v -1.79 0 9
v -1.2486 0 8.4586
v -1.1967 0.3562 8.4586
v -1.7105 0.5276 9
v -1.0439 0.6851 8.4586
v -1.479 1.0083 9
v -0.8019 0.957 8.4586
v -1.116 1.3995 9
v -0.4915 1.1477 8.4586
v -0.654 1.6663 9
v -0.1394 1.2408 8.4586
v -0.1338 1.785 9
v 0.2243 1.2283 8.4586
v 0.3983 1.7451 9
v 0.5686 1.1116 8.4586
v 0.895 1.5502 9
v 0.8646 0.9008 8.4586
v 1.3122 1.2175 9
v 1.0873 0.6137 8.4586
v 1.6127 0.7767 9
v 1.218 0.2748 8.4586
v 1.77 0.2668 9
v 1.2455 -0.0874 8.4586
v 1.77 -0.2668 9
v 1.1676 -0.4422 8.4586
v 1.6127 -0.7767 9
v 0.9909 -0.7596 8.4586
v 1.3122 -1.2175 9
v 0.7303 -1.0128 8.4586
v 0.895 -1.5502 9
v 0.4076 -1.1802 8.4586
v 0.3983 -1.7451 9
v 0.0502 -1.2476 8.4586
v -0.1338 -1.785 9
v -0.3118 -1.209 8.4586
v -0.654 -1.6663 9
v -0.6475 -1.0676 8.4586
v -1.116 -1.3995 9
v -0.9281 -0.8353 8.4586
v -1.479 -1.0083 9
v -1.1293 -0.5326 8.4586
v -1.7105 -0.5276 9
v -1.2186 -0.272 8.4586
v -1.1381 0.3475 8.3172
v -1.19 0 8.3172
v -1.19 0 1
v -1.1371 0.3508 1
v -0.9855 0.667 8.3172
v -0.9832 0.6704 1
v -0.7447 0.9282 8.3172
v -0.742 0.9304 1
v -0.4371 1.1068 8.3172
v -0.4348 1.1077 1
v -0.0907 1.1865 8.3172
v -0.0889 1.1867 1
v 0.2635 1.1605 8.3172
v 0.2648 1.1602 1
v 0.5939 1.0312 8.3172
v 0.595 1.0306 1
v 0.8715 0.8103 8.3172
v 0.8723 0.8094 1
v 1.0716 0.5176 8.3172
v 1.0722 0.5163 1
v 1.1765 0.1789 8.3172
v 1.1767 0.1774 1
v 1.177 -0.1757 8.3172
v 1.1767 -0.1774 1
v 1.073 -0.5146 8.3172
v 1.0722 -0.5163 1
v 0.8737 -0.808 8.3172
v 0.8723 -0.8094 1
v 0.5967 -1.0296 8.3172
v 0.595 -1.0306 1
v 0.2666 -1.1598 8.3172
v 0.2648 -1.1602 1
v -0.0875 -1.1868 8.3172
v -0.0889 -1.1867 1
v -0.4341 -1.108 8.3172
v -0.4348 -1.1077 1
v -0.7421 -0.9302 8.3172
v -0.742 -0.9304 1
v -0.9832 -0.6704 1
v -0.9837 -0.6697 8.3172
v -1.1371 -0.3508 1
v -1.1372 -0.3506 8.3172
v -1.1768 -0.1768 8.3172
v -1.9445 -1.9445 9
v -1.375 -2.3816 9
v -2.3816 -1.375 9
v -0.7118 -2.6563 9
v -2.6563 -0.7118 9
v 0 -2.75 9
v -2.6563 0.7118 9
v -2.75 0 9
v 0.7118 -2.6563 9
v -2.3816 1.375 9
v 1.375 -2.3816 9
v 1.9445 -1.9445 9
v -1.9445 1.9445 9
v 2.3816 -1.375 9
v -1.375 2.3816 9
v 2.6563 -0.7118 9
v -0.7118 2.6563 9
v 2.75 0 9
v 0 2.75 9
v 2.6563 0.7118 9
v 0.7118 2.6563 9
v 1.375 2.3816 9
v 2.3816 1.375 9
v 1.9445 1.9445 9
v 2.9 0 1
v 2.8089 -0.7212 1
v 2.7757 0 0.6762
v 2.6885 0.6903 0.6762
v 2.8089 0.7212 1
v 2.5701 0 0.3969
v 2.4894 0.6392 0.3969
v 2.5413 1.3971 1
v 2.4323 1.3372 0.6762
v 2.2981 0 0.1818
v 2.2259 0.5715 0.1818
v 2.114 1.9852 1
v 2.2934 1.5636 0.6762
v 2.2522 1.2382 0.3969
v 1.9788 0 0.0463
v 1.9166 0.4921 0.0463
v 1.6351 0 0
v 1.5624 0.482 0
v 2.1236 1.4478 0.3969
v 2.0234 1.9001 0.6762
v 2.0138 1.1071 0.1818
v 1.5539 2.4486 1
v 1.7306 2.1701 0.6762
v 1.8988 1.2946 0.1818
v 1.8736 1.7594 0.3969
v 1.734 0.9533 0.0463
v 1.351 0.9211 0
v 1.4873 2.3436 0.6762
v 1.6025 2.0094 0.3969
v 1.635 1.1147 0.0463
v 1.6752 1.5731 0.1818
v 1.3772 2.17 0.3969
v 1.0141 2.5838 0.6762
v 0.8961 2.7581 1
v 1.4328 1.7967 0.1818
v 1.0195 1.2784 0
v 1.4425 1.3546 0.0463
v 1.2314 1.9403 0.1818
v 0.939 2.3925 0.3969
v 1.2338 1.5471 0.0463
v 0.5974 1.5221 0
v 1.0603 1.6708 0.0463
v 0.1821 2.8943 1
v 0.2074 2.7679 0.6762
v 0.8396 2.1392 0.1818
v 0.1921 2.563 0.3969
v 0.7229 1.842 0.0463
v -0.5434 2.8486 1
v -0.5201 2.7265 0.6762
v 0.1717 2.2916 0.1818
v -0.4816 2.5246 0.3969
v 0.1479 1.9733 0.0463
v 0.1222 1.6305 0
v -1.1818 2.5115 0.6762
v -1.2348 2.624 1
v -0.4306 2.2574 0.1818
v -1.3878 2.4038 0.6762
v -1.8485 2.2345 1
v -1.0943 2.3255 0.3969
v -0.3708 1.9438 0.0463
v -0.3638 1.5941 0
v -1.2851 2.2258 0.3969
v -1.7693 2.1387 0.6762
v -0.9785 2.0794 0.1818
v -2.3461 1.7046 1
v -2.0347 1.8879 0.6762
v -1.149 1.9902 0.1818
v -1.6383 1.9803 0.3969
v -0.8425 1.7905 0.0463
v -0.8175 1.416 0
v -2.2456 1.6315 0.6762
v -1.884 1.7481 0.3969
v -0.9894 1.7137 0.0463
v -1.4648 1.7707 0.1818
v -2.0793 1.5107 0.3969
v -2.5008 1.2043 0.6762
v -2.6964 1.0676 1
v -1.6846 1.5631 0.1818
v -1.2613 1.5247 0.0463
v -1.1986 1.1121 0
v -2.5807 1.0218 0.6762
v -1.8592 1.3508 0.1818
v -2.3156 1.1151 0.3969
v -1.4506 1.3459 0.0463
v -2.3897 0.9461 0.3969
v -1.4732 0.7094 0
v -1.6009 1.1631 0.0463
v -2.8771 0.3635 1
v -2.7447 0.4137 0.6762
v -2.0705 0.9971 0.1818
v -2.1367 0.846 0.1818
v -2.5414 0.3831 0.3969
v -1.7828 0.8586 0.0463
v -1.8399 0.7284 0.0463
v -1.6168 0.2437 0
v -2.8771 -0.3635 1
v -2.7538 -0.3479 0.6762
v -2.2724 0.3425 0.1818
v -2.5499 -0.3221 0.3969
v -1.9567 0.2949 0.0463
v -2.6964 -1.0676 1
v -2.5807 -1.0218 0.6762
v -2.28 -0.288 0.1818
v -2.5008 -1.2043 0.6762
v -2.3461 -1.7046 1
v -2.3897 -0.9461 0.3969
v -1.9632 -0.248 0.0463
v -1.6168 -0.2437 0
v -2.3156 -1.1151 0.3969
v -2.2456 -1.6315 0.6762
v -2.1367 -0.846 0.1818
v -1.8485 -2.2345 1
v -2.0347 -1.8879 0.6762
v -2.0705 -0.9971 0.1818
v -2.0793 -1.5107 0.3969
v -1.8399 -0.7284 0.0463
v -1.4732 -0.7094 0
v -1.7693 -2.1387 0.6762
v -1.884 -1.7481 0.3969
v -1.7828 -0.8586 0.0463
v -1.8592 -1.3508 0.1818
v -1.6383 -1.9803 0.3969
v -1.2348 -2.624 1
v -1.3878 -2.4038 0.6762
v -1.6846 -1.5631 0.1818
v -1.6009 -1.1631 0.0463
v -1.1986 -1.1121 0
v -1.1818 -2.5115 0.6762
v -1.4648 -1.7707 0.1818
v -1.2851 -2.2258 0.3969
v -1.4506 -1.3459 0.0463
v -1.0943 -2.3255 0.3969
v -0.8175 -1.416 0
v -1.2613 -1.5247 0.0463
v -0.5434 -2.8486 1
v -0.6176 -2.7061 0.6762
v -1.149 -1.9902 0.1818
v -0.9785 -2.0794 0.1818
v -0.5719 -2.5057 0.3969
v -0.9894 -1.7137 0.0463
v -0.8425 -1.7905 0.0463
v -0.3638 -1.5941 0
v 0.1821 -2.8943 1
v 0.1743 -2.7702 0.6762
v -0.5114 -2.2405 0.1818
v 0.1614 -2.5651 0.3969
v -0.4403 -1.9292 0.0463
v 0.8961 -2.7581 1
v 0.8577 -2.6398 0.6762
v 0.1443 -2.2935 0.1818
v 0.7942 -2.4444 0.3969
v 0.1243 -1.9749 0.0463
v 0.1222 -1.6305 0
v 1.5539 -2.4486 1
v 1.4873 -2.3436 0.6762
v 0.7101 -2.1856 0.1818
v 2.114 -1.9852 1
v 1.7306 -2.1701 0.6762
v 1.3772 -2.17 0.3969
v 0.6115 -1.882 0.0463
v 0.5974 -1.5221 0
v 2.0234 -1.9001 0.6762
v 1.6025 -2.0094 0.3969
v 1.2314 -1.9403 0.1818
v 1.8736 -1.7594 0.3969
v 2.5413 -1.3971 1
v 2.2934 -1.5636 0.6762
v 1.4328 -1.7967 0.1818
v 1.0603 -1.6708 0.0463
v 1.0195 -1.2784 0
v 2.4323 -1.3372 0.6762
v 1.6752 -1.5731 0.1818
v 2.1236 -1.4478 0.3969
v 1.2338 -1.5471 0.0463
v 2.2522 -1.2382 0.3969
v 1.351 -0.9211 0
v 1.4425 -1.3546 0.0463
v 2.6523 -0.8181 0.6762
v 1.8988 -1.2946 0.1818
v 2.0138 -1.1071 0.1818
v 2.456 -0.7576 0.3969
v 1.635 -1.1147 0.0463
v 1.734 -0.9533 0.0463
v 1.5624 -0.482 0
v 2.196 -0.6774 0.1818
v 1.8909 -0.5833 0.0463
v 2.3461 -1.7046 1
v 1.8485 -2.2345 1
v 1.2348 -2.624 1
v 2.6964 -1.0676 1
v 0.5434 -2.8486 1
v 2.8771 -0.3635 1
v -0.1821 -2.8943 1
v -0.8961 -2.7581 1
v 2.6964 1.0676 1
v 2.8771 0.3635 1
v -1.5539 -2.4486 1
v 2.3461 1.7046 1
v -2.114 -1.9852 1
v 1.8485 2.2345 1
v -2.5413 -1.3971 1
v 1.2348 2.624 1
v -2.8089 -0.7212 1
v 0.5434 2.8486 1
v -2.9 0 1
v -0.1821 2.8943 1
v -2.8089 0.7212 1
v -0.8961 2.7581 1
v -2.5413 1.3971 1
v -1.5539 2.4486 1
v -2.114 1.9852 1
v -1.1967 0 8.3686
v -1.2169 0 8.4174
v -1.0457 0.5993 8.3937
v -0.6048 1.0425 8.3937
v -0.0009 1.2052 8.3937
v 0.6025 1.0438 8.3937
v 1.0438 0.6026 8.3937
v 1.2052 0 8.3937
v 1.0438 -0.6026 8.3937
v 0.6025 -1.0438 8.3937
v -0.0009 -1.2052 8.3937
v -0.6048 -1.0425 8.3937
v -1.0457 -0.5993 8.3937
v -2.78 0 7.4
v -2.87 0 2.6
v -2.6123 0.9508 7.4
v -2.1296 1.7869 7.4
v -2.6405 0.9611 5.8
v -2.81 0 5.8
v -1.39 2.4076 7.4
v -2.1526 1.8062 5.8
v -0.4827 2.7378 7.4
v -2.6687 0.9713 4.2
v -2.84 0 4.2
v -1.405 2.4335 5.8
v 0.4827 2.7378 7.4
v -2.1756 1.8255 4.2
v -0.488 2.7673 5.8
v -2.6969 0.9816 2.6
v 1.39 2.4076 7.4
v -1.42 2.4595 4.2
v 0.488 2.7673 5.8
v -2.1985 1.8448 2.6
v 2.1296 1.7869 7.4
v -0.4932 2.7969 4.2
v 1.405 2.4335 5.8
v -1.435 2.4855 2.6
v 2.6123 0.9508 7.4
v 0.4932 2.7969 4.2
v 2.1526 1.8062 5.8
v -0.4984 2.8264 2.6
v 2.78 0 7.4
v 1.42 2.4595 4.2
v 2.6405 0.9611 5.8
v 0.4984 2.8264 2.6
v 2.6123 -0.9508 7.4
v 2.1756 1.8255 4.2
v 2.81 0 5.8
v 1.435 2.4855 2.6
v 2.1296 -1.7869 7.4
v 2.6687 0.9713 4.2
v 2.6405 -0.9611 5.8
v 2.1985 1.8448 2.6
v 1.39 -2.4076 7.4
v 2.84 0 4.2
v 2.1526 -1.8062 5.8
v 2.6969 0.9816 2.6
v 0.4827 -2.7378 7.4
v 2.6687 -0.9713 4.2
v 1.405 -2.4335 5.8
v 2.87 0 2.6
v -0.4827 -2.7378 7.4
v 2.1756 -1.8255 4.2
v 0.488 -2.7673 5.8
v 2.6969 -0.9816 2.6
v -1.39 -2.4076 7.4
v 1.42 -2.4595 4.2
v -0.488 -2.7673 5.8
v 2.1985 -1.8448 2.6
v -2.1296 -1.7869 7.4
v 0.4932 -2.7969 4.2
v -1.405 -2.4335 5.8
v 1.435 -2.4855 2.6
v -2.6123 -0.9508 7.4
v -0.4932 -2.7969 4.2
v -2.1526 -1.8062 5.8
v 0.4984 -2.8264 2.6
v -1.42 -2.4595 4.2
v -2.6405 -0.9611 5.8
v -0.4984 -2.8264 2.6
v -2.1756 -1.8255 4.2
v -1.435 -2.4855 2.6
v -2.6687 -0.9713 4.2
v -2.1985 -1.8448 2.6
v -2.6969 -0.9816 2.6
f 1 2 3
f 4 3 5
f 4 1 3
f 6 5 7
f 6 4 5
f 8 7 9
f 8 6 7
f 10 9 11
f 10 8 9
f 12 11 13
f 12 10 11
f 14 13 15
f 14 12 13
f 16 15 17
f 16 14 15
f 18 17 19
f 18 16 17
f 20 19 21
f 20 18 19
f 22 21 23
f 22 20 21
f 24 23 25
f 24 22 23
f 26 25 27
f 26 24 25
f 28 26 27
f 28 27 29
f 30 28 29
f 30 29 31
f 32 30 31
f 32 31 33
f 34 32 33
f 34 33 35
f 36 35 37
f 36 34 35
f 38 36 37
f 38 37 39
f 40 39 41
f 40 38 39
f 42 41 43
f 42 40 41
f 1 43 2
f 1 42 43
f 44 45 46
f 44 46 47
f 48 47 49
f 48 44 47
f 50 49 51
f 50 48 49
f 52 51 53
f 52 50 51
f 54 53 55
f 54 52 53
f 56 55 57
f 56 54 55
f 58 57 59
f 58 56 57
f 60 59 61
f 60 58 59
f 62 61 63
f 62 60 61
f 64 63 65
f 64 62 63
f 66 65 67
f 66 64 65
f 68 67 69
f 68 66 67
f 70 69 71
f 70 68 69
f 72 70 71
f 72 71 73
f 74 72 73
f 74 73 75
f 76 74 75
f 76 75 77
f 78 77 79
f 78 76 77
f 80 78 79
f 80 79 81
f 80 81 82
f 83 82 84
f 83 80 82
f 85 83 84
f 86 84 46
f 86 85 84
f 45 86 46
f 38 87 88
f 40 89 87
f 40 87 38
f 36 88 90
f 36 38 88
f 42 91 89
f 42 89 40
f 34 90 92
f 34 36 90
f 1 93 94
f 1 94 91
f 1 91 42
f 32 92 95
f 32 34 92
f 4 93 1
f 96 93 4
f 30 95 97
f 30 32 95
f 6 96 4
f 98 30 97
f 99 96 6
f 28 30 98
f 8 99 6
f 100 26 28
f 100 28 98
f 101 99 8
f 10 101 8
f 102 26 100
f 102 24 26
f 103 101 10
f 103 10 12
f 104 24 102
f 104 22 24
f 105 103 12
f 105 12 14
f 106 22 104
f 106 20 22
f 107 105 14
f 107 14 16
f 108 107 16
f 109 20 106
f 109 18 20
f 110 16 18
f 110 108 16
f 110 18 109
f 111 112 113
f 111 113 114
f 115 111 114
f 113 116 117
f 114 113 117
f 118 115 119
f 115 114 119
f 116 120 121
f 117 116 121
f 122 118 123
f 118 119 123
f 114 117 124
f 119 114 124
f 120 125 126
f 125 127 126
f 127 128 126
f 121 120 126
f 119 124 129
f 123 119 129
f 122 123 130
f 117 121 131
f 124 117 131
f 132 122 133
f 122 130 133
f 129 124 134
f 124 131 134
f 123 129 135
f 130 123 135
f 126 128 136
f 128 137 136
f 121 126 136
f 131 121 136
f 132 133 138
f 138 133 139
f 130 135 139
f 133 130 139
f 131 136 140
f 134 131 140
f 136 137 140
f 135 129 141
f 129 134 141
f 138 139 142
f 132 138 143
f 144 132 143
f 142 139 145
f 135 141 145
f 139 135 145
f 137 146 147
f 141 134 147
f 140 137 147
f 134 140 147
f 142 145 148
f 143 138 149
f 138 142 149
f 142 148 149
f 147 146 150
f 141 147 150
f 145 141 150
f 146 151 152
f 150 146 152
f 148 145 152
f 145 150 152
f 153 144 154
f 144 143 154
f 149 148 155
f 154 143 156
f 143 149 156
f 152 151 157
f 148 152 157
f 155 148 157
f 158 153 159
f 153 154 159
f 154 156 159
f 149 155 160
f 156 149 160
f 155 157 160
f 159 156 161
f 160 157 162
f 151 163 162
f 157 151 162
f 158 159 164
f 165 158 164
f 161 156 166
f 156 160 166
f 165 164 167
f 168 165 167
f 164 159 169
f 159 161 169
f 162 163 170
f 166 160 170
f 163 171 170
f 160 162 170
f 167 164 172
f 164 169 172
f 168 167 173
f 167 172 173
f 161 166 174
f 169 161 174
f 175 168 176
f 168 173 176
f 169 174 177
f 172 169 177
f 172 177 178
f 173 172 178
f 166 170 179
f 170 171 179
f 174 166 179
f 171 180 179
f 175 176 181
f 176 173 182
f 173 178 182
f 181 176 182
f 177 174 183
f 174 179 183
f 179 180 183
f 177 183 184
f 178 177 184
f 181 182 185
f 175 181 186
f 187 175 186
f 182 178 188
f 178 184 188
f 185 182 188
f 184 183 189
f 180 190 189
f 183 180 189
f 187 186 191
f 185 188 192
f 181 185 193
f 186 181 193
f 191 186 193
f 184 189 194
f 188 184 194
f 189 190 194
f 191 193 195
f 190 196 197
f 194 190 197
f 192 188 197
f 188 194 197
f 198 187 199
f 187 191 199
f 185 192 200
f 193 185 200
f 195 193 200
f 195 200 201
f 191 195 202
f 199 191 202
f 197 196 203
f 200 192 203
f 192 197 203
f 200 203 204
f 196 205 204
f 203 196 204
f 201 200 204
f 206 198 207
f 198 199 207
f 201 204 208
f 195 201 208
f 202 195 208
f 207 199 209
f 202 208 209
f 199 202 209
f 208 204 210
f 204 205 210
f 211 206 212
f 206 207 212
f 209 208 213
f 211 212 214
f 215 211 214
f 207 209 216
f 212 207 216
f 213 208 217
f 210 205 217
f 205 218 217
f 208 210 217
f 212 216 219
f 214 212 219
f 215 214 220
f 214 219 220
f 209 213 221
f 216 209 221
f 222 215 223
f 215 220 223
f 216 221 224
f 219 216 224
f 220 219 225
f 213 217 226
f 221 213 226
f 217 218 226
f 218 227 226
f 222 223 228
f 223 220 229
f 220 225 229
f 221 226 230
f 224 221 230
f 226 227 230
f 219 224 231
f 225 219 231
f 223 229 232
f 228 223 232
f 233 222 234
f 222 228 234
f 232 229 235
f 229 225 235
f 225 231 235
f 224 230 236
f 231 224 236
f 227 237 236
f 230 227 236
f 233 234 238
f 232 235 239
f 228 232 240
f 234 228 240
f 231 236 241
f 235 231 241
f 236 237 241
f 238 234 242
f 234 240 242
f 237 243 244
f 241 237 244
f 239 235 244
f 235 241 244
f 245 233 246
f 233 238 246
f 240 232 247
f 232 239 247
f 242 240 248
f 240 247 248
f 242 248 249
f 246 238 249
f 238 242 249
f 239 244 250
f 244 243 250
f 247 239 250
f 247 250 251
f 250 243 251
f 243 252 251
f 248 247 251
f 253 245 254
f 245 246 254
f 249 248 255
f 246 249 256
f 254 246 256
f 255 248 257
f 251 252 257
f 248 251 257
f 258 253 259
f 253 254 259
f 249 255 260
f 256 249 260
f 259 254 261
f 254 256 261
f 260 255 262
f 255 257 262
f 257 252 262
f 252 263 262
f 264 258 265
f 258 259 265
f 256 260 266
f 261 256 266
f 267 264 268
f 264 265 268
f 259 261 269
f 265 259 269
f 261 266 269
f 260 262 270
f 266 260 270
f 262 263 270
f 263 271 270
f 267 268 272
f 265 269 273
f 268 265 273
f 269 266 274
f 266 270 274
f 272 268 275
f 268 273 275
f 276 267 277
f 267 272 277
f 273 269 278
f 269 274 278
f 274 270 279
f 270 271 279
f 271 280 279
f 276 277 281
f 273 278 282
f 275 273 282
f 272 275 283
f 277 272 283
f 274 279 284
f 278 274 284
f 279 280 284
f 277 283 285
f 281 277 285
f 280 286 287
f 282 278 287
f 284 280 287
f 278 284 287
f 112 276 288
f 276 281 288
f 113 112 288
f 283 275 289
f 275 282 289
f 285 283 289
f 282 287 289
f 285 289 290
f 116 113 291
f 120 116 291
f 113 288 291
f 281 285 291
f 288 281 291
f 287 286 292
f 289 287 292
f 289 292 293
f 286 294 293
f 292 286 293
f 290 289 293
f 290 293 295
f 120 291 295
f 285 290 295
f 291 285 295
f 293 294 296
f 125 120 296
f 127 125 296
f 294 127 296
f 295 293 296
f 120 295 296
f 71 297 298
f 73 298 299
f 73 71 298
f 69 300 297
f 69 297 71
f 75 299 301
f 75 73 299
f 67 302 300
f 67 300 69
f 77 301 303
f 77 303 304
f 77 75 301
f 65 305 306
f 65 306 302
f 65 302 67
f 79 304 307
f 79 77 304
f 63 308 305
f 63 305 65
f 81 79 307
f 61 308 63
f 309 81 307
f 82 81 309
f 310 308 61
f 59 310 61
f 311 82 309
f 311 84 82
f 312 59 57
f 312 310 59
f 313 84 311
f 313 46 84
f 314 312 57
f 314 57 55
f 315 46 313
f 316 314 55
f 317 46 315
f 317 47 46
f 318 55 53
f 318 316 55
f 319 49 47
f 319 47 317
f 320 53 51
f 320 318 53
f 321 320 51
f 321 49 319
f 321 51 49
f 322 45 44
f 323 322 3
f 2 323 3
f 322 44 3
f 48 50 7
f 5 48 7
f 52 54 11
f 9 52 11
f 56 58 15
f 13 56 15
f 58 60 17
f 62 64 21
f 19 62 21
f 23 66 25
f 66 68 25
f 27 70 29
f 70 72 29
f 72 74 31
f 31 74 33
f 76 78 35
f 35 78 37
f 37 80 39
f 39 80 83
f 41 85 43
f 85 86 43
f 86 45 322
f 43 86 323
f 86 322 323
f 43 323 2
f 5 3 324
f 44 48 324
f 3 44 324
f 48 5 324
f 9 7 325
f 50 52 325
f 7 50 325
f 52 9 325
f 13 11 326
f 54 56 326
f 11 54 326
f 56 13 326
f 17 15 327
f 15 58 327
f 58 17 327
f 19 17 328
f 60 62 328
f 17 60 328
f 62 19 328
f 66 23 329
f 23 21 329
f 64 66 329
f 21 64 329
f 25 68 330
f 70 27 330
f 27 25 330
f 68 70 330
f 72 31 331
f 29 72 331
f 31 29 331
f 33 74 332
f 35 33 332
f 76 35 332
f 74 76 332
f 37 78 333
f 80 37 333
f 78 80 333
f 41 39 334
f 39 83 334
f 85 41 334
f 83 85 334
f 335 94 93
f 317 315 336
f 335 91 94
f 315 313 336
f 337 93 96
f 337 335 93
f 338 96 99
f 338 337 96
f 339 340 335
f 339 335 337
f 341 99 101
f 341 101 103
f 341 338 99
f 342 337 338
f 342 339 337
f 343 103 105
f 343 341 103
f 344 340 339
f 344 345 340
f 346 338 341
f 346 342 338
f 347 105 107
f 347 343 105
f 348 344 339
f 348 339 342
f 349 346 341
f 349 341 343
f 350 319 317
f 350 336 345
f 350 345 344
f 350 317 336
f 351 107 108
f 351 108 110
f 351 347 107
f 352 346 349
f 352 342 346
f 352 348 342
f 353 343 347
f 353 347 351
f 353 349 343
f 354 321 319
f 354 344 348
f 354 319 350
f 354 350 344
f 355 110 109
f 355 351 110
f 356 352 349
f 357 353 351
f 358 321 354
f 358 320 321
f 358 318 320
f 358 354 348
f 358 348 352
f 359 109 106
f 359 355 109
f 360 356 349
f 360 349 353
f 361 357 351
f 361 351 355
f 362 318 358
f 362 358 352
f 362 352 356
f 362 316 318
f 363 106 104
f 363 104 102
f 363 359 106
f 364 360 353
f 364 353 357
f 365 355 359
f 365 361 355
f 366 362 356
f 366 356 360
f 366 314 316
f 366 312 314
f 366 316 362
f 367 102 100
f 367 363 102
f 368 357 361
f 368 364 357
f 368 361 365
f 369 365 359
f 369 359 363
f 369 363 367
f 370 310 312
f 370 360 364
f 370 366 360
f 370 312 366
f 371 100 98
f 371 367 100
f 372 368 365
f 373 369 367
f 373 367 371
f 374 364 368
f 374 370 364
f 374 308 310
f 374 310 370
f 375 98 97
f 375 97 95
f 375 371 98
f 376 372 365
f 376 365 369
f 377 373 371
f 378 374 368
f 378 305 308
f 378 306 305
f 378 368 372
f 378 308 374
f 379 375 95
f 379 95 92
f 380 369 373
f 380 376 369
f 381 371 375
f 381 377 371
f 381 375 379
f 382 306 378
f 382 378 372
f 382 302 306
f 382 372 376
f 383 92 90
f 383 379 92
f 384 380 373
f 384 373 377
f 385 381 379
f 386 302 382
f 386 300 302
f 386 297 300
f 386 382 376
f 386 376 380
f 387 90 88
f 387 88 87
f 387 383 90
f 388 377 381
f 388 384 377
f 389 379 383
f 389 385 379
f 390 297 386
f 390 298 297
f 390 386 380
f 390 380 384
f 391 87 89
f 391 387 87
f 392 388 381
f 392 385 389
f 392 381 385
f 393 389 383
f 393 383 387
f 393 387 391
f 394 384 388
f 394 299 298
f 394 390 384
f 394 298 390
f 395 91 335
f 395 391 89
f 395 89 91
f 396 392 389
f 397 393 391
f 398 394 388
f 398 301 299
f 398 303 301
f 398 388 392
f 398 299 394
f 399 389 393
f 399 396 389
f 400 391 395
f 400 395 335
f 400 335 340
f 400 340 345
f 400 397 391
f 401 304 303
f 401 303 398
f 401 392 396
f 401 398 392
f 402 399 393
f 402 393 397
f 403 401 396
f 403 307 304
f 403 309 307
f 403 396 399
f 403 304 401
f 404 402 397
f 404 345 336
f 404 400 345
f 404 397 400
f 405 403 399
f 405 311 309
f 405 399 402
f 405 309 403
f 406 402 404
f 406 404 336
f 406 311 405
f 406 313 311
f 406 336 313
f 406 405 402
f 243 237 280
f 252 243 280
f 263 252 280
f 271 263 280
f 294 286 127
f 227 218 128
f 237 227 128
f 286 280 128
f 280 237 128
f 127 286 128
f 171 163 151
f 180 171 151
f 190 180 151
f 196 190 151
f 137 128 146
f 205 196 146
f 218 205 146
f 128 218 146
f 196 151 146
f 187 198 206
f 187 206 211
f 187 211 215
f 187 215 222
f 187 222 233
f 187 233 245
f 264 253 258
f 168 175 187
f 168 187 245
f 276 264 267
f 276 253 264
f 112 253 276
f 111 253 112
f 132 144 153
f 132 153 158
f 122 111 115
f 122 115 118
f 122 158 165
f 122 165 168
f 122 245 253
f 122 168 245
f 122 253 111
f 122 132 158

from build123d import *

# Parameters (mm, degrees)
F0_R     = 2.9
F1_DEPTH = 1
F5_SIZE  = 0.6
F6_R     = 0.2


# Not quite as in the source:
# - a fillet or chamfer that OpenCascade refuses, or shapes differently, is made with other operations: its cross-section is extruded or revolved along the edge and cut away or added


with BuildPart() as f1:
    # F0 (on Top) → F1 (new body)
    with BuildSketch(Plane.XY):
        Circle(F0_R)
    extrude(amount=F1_DEPTH)

    # F4: fillet of radius 1.3 on 1 edges, made by hand

    # F4_s1 → F4_t2 (revolve, cut)
    with BuildSketch(Plane.XZ):
        with BuildLine():
            ThreePointArc((2.9, 1), (2.4413147108, 0.2801960973), (1.6350889359, 0))
            Line((1.6350889359, 0), (2.9, 0))
            Line((2.9, 0), (2.9, 1))
        make_face()
    revolve(axis=Axis((0, 0, 0), (0, 0, 1)), mode=Mode.SUBTRACT)


with BuildPart() as f3:
    # F2 (on Front) → F3 (revolve)
    with BuildSketch(Plane.XZ):
        Polygon((-2.9, 1), (-1.19, 1), (-1.19, 9), (-2.75, 9), align=None)
    revolve(axis=Axis((0, 0, 5), (0, 0, -1)))

    # F5
    f5_edges = [f3.edges().sort_by_distance(p)[0] for p in [
        (1.19, 0, 9),
    ]]
    chamfer(f5_edges, length=F5_SIZE)

    # F6
    f6_edges = [f3.edges().sort_by_distance(p)[0] for p in [
        (1.19, 0, 8.4),
    ]]
    fillet(f6_edges, radius=F6_R)


solid = Compound([f1.part, f3.part])
